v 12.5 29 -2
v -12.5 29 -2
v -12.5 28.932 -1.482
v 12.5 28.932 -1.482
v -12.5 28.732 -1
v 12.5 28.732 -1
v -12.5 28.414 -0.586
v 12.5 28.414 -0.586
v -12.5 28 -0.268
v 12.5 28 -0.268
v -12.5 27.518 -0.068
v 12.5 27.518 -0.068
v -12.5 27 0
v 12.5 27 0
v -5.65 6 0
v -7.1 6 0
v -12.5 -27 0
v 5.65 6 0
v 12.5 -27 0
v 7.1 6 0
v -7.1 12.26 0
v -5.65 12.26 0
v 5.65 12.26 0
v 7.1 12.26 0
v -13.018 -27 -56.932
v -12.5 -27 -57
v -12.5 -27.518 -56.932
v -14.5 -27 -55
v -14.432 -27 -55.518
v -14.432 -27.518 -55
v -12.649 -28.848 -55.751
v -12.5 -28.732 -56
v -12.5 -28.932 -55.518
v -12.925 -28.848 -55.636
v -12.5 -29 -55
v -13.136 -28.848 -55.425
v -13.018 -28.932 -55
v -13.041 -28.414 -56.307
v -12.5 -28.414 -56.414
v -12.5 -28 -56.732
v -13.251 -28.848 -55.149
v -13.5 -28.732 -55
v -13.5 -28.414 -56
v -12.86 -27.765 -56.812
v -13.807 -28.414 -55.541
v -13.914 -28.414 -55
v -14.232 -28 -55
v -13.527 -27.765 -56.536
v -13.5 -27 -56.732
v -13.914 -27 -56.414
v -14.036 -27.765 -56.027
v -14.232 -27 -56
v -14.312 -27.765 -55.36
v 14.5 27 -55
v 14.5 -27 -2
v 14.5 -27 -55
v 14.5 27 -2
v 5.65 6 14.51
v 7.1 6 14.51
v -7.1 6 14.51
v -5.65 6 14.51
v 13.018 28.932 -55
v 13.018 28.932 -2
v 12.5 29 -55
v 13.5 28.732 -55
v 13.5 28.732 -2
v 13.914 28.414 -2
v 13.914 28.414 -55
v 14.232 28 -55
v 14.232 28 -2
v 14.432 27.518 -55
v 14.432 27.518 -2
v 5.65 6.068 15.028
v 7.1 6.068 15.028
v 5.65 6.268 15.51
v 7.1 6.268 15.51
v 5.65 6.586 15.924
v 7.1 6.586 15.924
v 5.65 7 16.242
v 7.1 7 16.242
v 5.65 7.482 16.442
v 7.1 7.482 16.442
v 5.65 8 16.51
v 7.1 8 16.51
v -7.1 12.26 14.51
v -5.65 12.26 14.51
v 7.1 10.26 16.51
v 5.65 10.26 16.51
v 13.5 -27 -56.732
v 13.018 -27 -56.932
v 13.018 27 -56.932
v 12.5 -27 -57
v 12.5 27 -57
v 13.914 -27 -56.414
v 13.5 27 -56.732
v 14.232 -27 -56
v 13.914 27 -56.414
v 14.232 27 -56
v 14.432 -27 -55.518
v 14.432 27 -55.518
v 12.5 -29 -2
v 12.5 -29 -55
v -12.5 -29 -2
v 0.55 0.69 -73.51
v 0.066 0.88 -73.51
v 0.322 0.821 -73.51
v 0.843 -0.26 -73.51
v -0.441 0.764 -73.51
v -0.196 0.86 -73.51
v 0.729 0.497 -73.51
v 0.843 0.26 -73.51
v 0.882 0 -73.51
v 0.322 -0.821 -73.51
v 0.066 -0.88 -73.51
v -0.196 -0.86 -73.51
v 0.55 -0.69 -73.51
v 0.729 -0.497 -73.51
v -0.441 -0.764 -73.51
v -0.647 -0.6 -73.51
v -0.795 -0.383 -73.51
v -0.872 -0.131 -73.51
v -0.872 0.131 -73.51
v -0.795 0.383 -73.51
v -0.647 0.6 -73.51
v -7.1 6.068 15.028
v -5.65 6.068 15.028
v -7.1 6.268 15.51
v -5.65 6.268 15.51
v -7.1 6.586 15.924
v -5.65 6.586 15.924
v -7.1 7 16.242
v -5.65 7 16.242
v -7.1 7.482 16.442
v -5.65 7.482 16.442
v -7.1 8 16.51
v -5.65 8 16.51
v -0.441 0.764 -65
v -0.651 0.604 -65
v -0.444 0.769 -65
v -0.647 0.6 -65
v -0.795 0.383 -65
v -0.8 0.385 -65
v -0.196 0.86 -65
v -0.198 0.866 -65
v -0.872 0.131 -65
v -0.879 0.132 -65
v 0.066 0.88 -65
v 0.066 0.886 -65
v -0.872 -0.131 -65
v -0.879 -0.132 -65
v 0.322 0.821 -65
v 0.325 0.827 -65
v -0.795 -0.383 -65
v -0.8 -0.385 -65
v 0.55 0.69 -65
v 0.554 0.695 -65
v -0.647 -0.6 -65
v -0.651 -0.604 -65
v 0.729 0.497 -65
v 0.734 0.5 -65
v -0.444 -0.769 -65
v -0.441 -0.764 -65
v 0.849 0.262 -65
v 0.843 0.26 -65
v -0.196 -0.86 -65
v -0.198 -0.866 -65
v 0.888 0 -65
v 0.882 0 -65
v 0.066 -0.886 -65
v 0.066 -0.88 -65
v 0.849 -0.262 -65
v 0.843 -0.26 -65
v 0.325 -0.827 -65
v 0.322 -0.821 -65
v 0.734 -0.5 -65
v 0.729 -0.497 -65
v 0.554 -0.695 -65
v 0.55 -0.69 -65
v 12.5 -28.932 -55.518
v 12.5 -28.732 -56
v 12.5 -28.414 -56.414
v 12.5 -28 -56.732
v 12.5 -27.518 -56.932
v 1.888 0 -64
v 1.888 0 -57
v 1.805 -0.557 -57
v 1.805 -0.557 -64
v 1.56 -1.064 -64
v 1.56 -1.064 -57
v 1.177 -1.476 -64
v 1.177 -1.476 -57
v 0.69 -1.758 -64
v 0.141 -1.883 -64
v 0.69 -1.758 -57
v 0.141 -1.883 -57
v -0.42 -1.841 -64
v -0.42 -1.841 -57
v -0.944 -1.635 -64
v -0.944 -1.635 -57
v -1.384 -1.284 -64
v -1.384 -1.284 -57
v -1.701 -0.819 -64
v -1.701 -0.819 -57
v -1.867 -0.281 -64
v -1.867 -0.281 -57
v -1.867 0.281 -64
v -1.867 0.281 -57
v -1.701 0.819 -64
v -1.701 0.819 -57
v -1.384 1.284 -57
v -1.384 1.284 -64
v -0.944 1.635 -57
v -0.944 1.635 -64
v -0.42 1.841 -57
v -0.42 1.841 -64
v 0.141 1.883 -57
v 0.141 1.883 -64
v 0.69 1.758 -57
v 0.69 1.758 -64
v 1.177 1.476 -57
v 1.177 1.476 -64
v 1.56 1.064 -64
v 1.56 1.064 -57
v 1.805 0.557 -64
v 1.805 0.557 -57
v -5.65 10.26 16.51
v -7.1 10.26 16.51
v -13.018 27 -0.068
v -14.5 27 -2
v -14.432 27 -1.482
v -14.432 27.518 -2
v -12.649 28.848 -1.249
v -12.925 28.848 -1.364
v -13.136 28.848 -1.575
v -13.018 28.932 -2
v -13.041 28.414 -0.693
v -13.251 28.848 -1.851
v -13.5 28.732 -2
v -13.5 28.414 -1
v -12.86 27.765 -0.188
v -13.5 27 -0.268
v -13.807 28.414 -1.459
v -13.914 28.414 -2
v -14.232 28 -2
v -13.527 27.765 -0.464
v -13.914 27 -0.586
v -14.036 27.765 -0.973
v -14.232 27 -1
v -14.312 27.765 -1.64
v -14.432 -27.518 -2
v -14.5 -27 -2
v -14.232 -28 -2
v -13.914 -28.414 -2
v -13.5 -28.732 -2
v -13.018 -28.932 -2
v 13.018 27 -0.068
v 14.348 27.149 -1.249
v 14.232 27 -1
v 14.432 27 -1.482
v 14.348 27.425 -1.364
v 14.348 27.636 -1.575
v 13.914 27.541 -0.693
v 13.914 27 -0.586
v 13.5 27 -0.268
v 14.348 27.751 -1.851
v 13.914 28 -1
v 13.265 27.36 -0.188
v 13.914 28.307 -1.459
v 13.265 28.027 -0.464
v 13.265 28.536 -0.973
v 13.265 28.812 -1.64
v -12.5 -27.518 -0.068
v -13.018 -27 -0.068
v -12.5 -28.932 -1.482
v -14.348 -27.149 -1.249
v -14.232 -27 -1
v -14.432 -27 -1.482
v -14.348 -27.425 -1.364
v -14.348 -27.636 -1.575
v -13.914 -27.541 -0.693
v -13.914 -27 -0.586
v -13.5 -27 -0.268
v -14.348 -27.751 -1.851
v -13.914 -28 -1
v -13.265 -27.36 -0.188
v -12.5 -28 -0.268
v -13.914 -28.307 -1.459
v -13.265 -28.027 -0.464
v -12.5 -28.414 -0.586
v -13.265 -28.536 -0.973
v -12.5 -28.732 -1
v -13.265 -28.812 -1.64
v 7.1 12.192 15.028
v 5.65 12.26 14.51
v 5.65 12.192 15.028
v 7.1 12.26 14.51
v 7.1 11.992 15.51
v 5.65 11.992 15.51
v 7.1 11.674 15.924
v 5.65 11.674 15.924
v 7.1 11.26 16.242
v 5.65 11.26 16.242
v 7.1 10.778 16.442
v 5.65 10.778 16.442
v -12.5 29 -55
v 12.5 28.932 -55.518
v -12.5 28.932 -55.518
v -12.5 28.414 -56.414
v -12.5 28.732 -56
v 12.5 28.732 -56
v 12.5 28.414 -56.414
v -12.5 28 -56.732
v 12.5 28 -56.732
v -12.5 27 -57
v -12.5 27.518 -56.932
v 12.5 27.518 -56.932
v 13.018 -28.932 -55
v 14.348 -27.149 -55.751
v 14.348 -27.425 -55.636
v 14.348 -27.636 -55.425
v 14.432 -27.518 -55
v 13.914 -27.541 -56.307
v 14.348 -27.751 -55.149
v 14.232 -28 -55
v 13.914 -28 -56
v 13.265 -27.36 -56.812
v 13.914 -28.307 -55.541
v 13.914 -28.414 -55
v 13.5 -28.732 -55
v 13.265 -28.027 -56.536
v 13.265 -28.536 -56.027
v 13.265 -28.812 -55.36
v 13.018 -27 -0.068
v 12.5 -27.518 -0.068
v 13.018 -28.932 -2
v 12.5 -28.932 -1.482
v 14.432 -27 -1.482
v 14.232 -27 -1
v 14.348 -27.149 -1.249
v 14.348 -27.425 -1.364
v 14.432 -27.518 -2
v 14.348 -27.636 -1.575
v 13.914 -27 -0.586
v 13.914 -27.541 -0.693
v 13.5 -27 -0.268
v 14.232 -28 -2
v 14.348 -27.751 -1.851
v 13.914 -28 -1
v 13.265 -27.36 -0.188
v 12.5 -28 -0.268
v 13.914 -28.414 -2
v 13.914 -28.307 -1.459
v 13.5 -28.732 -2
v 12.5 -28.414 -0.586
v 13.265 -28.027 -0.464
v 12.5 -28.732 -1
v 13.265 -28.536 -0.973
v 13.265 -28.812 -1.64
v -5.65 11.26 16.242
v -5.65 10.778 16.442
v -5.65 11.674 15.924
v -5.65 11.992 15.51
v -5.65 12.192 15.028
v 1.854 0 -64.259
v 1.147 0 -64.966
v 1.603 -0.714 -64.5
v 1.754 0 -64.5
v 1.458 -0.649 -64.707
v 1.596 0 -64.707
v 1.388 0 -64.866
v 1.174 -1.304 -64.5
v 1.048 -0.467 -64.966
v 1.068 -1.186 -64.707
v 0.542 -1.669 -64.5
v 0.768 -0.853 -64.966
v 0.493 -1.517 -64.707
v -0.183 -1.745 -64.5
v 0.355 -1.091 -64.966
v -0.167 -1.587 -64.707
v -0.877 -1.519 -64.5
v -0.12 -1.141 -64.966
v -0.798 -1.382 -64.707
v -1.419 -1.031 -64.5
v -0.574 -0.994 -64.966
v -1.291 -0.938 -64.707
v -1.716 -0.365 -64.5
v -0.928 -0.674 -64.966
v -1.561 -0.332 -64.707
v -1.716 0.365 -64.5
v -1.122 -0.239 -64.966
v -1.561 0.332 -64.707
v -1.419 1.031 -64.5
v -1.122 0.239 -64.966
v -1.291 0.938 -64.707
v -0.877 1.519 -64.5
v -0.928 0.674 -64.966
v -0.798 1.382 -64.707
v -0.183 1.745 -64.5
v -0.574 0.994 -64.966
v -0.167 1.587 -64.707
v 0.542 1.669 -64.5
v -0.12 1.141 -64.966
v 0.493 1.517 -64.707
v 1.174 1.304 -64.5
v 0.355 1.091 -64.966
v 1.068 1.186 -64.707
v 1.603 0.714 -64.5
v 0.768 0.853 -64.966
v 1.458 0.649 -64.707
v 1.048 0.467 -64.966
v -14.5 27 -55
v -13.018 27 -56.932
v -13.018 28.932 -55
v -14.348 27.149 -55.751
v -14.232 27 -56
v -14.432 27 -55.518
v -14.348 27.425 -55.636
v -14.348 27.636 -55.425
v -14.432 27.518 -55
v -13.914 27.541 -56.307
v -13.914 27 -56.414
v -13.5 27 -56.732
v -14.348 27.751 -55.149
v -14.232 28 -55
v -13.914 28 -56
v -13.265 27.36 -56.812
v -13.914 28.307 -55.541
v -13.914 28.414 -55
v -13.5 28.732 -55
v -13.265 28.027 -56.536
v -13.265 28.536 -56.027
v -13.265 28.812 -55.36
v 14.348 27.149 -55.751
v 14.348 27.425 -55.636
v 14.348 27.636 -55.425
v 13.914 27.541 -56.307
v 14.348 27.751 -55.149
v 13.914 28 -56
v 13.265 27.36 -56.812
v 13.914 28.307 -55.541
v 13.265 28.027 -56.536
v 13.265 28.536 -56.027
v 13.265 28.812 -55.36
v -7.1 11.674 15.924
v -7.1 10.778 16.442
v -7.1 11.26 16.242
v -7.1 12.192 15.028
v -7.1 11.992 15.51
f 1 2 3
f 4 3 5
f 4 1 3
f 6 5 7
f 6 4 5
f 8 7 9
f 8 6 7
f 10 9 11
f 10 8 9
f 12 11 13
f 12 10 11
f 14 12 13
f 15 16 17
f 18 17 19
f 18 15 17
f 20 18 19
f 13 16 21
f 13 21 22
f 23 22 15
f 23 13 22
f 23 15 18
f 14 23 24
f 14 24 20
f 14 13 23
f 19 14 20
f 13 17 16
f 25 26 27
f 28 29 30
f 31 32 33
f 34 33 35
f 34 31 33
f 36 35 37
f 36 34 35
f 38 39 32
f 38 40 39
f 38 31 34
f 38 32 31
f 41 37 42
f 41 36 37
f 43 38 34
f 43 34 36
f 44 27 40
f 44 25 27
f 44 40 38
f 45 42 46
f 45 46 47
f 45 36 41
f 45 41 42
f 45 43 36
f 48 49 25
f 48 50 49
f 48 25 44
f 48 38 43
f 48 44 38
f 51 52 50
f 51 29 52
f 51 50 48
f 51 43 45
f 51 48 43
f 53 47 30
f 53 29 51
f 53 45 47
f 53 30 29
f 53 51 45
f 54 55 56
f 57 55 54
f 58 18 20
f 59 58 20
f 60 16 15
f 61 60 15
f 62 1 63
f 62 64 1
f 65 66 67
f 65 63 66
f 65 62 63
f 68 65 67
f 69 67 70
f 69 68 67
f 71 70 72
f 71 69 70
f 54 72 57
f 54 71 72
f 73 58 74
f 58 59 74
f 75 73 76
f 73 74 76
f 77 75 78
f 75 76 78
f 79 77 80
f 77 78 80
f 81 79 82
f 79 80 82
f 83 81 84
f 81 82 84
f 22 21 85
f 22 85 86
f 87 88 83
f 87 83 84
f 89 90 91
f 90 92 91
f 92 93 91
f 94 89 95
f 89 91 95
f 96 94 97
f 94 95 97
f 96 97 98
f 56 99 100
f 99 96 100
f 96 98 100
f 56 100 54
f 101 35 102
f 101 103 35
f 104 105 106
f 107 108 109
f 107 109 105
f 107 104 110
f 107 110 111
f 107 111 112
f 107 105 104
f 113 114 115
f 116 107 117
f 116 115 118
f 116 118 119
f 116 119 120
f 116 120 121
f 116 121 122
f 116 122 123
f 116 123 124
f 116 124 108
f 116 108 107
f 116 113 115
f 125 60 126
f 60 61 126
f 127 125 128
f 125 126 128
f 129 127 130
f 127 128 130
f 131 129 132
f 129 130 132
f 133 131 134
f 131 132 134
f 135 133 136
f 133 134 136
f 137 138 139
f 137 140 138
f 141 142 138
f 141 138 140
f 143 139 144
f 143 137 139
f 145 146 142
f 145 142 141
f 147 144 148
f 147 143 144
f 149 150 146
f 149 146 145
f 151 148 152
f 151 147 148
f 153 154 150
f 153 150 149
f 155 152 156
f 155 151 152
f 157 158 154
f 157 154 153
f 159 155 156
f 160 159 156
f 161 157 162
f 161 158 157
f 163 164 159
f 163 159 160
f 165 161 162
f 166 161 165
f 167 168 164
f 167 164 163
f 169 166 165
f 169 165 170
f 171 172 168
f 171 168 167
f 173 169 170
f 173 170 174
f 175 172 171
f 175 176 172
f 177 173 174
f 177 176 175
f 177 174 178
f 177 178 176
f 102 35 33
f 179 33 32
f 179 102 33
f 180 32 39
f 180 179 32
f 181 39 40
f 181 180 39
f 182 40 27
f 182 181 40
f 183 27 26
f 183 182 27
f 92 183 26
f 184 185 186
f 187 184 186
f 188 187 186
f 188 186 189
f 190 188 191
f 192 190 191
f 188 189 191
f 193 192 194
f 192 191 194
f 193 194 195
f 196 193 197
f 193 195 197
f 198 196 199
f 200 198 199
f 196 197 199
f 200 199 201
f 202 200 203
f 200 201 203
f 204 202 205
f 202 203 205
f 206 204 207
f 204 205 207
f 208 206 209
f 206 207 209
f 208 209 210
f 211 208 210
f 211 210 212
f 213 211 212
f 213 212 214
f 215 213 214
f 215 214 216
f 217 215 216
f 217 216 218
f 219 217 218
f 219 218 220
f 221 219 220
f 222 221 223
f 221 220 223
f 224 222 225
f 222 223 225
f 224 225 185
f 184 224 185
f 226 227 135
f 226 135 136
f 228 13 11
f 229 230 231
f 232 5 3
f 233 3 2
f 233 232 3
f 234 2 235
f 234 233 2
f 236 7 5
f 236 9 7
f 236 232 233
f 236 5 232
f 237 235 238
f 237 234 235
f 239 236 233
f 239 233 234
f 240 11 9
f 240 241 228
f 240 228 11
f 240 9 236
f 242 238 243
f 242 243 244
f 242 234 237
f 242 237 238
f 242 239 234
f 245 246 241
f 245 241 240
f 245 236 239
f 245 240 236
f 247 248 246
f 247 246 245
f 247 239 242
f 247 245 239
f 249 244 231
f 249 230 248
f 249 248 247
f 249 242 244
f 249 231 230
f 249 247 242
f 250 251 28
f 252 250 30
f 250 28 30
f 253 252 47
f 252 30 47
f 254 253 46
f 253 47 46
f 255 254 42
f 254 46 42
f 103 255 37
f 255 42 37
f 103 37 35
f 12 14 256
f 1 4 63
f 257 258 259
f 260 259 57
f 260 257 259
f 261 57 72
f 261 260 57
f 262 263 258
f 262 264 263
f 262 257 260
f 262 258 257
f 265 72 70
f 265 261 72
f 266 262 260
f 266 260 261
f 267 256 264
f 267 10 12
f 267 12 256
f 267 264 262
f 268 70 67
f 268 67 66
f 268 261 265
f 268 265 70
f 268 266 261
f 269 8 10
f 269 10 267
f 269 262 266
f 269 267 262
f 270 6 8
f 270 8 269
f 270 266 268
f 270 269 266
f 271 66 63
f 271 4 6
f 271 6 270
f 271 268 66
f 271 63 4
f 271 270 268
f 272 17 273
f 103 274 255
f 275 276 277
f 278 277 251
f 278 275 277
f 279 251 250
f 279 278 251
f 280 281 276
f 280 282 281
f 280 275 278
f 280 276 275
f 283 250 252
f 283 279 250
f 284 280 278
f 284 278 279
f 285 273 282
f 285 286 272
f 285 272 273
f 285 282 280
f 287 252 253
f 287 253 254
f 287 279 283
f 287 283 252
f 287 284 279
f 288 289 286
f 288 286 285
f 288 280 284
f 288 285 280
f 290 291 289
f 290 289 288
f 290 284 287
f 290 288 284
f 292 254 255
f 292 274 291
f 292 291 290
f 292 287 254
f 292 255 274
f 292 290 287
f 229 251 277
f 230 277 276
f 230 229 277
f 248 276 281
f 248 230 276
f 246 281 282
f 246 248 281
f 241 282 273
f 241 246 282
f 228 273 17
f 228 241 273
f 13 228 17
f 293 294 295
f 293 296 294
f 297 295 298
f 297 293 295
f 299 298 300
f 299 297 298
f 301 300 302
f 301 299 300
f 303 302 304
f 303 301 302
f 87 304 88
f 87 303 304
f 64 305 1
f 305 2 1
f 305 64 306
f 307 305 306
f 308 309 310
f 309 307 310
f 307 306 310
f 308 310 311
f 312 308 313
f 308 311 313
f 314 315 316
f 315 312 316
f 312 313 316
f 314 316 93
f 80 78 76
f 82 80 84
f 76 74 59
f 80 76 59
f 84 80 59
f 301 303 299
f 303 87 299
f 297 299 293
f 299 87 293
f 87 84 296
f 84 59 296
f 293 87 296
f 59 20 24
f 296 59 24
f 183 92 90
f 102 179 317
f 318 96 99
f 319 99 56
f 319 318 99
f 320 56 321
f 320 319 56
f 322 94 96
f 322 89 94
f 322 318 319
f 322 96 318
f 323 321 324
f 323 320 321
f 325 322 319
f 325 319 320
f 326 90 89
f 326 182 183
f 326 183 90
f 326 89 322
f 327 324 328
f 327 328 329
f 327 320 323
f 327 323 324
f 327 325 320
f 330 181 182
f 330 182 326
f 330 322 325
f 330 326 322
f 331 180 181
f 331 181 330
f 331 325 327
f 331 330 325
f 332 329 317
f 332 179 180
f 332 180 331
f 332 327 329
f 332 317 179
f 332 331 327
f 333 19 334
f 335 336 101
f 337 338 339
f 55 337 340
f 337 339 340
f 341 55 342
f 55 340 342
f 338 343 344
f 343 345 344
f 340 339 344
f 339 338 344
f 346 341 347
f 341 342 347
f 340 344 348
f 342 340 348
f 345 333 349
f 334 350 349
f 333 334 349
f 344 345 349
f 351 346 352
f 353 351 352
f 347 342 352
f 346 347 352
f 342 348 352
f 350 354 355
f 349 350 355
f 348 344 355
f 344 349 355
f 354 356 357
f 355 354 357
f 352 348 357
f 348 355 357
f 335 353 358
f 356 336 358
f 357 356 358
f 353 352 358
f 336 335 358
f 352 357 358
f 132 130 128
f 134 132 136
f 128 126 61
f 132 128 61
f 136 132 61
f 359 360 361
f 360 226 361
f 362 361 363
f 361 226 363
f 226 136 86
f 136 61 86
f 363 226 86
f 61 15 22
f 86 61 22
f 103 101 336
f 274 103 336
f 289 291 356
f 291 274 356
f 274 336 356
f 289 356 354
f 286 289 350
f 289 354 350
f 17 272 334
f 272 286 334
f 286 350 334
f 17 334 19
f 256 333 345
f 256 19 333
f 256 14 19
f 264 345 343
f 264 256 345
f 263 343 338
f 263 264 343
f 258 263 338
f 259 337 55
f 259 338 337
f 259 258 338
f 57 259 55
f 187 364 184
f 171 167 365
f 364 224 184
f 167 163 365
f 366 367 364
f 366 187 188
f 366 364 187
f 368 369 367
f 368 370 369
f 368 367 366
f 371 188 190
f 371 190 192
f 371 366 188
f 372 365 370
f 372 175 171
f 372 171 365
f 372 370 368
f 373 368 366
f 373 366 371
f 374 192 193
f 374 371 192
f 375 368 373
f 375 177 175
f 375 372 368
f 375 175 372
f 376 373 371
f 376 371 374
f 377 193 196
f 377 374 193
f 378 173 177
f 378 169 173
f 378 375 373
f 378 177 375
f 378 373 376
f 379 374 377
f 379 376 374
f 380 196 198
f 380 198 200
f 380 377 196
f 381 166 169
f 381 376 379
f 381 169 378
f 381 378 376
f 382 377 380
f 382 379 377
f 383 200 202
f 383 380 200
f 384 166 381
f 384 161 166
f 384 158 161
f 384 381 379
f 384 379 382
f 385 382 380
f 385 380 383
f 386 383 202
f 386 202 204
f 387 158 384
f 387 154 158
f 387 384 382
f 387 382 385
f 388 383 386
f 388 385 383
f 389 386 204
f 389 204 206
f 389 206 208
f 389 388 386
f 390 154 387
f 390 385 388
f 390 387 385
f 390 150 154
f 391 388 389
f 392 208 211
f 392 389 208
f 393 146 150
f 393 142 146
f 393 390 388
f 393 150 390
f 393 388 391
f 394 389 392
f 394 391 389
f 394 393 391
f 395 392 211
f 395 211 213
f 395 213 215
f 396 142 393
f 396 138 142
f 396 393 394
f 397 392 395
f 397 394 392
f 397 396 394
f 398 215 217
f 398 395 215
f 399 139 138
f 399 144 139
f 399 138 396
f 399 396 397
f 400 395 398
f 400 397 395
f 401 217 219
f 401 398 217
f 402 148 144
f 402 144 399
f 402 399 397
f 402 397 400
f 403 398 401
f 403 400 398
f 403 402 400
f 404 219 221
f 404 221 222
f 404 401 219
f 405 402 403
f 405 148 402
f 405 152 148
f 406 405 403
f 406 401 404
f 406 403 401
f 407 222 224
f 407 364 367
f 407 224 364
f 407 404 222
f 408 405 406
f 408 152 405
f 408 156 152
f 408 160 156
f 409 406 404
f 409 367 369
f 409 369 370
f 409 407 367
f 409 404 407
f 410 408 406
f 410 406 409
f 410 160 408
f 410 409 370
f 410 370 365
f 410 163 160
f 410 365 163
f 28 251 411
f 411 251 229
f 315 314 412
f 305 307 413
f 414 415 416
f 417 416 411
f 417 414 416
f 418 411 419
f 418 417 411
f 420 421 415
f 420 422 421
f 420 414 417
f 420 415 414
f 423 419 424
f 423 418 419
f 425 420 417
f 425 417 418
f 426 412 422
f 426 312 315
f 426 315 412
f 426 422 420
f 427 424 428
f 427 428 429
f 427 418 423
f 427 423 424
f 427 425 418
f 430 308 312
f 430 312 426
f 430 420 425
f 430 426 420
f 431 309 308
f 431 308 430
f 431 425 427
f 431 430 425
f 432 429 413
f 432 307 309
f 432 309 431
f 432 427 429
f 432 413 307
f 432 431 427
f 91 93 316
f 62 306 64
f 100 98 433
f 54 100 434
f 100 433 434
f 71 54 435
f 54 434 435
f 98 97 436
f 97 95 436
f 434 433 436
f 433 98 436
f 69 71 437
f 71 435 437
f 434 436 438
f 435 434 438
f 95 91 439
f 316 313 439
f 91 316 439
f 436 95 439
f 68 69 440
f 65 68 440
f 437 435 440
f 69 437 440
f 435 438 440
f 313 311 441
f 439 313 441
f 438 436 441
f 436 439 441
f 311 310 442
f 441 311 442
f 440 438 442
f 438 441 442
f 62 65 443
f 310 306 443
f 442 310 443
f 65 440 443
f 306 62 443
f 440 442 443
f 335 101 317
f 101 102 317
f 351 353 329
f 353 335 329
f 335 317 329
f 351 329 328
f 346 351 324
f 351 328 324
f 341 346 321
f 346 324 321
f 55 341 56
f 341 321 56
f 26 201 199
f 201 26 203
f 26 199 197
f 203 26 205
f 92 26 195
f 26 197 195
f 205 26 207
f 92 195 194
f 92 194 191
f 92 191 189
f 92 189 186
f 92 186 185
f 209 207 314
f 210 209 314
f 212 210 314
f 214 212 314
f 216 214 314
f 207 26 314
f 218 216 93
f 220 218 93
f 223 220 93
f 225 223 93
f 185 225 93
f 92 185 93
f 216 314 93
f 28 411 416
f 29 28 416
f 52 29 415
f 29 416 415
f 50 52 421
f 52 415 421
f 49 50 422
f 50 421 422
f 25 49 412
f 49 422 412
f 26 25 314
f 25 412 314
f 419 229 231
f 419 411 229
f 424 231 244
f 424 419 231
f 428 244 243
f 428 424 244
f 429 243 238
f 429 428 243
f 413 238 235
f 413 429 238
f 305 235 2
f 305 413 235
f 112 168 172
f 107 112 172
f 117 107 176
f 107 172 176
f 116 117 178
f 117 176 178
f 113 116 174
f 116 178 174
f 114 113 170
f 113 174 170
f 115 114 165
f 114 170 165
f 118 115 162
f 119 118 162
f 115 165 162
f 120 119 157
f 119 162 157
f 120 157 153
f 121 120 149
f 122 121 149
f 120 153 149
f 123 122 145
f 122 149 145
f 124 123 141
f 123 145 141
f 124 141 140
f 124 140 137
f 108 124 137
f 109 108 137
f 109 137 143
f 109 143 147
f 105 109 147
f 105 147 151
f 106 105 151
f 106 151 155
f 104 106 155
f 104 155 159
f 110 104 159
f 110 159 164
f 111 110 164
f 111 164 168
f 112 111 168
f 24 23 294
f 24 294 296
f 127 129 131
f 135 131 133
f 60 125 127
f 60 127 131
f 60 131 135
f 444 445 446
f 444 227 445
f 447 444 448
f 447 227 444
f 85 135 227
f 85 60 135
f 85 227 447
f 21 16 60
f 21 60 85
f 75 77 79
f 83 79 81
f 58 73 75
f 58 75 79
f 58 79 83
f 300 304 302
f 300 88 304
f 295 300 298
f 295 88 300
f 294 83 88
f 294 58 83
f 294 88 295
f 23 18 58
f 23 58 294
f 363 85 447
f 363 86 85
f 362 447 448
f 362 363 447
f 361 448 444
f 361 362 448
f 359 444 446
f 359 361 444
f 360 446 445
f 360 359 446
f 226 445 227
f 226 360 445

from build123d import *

# Parameters (mm, degrees)
SKETCH1_W           = 29
SKETCH1_H           = 58
BOSS_EXTRUDE1_DEPTH = 57
SKETCH1_3_W         = 1.45
SKETCH1_3_H         = 6.26
BOSS_EXTRUDE2_DEPTH = 16.51
FILLET1_R           = 2
SKETCH2_R           = 0.882124602
BOSS_EXTRUDE3_DEPTH = 16.51
SKETCH2_3_R         = 1.888458119
SKETCH2_3_R_2       = 0.882124602
BOSS_EXTRUDE4_DEPTH = 8
FILLET2_R           = 1


with BuildPart() as part:
    # Sketch1 → Boss-Extrude1 (new body)
    with BuildSketch(Plane.XY):
        Rectangle(SKETCH1_W, SKETCH1_H)
    extrude(amount=-BOSS_EXTRUDE1_DEPTH)

    # Sketch1<3> → Boss-Extrude2 (add)
    with BuildSketch(Plane.XY):
        with Locations((-6.375, 9.13)):
            Rectangle(SKETCH1_3_W, SKETCH1_3_H)
        with Locations((6.375, 9.13)):
            Rectangle(SKETCH1_3_W, SKETCH1_3_H)
    extrude(amount=BOSS_EXTRUDE2_DEPTH)

    # Fillet1
    fillet1_edges = [part.edges().sort_by_distance(p)[0] for p in [
        (-14.5, 29, -28.5),
        (0, 29, -57),
        (14.5, 29, -28.5),
        (0, 29, 0),
        (-6.375, 12.26, 16.51),
        (-6.375, 6, 16.51),
        (6.375, 6, 16.51),
        (6.375, 12.26, 16.51),
        (0, -29, 0),
        (-14.5, 0, 0),
        (-14.5, 0, -57),
        (-14.5, -29, -28.5),
        (0, -29, -57),
        (14.5, -29, -28.5),
        (14.5, 0, -57),
        (14.5, 0, 0),
    ]]
    fillet(fillet1_edges, radius=FILLET1_R)

    # Sketch2 → Boss-Extrude3 (add)
    with BuildSketch(Plane(origin=(0, 0, -57), x_dir=(-1, 0, 0), z_dir=(0, 0, -1))):
        Circle(SKETCH2_R)
    extrude(amount=BOSS_EXTRUDE3_DEPTH)

    # Sketch2<3> → Boss-Extrude4 (add)
    with BuildSketch(Plane(origin=(0, 0, -57), x_dir=(-1, 0, 0), z_dir=(0, 0, -1))):
        Circle(SKETCH2_3_R)
        Circle(SKETCH2_3_R_2, mode=Mode.SUBTRACT)
    extrude(amount=BOSS_EXTRUDE4_DEPTH)

    # Fillet2
    fillet2_edges = [part.edges().sort_by_distance(p)[0] for p in [
        (1.888458119, 0, -65),
    ]]
    fillet(fillet2_edges, radius=FILLET2_R)


solid = part.part
